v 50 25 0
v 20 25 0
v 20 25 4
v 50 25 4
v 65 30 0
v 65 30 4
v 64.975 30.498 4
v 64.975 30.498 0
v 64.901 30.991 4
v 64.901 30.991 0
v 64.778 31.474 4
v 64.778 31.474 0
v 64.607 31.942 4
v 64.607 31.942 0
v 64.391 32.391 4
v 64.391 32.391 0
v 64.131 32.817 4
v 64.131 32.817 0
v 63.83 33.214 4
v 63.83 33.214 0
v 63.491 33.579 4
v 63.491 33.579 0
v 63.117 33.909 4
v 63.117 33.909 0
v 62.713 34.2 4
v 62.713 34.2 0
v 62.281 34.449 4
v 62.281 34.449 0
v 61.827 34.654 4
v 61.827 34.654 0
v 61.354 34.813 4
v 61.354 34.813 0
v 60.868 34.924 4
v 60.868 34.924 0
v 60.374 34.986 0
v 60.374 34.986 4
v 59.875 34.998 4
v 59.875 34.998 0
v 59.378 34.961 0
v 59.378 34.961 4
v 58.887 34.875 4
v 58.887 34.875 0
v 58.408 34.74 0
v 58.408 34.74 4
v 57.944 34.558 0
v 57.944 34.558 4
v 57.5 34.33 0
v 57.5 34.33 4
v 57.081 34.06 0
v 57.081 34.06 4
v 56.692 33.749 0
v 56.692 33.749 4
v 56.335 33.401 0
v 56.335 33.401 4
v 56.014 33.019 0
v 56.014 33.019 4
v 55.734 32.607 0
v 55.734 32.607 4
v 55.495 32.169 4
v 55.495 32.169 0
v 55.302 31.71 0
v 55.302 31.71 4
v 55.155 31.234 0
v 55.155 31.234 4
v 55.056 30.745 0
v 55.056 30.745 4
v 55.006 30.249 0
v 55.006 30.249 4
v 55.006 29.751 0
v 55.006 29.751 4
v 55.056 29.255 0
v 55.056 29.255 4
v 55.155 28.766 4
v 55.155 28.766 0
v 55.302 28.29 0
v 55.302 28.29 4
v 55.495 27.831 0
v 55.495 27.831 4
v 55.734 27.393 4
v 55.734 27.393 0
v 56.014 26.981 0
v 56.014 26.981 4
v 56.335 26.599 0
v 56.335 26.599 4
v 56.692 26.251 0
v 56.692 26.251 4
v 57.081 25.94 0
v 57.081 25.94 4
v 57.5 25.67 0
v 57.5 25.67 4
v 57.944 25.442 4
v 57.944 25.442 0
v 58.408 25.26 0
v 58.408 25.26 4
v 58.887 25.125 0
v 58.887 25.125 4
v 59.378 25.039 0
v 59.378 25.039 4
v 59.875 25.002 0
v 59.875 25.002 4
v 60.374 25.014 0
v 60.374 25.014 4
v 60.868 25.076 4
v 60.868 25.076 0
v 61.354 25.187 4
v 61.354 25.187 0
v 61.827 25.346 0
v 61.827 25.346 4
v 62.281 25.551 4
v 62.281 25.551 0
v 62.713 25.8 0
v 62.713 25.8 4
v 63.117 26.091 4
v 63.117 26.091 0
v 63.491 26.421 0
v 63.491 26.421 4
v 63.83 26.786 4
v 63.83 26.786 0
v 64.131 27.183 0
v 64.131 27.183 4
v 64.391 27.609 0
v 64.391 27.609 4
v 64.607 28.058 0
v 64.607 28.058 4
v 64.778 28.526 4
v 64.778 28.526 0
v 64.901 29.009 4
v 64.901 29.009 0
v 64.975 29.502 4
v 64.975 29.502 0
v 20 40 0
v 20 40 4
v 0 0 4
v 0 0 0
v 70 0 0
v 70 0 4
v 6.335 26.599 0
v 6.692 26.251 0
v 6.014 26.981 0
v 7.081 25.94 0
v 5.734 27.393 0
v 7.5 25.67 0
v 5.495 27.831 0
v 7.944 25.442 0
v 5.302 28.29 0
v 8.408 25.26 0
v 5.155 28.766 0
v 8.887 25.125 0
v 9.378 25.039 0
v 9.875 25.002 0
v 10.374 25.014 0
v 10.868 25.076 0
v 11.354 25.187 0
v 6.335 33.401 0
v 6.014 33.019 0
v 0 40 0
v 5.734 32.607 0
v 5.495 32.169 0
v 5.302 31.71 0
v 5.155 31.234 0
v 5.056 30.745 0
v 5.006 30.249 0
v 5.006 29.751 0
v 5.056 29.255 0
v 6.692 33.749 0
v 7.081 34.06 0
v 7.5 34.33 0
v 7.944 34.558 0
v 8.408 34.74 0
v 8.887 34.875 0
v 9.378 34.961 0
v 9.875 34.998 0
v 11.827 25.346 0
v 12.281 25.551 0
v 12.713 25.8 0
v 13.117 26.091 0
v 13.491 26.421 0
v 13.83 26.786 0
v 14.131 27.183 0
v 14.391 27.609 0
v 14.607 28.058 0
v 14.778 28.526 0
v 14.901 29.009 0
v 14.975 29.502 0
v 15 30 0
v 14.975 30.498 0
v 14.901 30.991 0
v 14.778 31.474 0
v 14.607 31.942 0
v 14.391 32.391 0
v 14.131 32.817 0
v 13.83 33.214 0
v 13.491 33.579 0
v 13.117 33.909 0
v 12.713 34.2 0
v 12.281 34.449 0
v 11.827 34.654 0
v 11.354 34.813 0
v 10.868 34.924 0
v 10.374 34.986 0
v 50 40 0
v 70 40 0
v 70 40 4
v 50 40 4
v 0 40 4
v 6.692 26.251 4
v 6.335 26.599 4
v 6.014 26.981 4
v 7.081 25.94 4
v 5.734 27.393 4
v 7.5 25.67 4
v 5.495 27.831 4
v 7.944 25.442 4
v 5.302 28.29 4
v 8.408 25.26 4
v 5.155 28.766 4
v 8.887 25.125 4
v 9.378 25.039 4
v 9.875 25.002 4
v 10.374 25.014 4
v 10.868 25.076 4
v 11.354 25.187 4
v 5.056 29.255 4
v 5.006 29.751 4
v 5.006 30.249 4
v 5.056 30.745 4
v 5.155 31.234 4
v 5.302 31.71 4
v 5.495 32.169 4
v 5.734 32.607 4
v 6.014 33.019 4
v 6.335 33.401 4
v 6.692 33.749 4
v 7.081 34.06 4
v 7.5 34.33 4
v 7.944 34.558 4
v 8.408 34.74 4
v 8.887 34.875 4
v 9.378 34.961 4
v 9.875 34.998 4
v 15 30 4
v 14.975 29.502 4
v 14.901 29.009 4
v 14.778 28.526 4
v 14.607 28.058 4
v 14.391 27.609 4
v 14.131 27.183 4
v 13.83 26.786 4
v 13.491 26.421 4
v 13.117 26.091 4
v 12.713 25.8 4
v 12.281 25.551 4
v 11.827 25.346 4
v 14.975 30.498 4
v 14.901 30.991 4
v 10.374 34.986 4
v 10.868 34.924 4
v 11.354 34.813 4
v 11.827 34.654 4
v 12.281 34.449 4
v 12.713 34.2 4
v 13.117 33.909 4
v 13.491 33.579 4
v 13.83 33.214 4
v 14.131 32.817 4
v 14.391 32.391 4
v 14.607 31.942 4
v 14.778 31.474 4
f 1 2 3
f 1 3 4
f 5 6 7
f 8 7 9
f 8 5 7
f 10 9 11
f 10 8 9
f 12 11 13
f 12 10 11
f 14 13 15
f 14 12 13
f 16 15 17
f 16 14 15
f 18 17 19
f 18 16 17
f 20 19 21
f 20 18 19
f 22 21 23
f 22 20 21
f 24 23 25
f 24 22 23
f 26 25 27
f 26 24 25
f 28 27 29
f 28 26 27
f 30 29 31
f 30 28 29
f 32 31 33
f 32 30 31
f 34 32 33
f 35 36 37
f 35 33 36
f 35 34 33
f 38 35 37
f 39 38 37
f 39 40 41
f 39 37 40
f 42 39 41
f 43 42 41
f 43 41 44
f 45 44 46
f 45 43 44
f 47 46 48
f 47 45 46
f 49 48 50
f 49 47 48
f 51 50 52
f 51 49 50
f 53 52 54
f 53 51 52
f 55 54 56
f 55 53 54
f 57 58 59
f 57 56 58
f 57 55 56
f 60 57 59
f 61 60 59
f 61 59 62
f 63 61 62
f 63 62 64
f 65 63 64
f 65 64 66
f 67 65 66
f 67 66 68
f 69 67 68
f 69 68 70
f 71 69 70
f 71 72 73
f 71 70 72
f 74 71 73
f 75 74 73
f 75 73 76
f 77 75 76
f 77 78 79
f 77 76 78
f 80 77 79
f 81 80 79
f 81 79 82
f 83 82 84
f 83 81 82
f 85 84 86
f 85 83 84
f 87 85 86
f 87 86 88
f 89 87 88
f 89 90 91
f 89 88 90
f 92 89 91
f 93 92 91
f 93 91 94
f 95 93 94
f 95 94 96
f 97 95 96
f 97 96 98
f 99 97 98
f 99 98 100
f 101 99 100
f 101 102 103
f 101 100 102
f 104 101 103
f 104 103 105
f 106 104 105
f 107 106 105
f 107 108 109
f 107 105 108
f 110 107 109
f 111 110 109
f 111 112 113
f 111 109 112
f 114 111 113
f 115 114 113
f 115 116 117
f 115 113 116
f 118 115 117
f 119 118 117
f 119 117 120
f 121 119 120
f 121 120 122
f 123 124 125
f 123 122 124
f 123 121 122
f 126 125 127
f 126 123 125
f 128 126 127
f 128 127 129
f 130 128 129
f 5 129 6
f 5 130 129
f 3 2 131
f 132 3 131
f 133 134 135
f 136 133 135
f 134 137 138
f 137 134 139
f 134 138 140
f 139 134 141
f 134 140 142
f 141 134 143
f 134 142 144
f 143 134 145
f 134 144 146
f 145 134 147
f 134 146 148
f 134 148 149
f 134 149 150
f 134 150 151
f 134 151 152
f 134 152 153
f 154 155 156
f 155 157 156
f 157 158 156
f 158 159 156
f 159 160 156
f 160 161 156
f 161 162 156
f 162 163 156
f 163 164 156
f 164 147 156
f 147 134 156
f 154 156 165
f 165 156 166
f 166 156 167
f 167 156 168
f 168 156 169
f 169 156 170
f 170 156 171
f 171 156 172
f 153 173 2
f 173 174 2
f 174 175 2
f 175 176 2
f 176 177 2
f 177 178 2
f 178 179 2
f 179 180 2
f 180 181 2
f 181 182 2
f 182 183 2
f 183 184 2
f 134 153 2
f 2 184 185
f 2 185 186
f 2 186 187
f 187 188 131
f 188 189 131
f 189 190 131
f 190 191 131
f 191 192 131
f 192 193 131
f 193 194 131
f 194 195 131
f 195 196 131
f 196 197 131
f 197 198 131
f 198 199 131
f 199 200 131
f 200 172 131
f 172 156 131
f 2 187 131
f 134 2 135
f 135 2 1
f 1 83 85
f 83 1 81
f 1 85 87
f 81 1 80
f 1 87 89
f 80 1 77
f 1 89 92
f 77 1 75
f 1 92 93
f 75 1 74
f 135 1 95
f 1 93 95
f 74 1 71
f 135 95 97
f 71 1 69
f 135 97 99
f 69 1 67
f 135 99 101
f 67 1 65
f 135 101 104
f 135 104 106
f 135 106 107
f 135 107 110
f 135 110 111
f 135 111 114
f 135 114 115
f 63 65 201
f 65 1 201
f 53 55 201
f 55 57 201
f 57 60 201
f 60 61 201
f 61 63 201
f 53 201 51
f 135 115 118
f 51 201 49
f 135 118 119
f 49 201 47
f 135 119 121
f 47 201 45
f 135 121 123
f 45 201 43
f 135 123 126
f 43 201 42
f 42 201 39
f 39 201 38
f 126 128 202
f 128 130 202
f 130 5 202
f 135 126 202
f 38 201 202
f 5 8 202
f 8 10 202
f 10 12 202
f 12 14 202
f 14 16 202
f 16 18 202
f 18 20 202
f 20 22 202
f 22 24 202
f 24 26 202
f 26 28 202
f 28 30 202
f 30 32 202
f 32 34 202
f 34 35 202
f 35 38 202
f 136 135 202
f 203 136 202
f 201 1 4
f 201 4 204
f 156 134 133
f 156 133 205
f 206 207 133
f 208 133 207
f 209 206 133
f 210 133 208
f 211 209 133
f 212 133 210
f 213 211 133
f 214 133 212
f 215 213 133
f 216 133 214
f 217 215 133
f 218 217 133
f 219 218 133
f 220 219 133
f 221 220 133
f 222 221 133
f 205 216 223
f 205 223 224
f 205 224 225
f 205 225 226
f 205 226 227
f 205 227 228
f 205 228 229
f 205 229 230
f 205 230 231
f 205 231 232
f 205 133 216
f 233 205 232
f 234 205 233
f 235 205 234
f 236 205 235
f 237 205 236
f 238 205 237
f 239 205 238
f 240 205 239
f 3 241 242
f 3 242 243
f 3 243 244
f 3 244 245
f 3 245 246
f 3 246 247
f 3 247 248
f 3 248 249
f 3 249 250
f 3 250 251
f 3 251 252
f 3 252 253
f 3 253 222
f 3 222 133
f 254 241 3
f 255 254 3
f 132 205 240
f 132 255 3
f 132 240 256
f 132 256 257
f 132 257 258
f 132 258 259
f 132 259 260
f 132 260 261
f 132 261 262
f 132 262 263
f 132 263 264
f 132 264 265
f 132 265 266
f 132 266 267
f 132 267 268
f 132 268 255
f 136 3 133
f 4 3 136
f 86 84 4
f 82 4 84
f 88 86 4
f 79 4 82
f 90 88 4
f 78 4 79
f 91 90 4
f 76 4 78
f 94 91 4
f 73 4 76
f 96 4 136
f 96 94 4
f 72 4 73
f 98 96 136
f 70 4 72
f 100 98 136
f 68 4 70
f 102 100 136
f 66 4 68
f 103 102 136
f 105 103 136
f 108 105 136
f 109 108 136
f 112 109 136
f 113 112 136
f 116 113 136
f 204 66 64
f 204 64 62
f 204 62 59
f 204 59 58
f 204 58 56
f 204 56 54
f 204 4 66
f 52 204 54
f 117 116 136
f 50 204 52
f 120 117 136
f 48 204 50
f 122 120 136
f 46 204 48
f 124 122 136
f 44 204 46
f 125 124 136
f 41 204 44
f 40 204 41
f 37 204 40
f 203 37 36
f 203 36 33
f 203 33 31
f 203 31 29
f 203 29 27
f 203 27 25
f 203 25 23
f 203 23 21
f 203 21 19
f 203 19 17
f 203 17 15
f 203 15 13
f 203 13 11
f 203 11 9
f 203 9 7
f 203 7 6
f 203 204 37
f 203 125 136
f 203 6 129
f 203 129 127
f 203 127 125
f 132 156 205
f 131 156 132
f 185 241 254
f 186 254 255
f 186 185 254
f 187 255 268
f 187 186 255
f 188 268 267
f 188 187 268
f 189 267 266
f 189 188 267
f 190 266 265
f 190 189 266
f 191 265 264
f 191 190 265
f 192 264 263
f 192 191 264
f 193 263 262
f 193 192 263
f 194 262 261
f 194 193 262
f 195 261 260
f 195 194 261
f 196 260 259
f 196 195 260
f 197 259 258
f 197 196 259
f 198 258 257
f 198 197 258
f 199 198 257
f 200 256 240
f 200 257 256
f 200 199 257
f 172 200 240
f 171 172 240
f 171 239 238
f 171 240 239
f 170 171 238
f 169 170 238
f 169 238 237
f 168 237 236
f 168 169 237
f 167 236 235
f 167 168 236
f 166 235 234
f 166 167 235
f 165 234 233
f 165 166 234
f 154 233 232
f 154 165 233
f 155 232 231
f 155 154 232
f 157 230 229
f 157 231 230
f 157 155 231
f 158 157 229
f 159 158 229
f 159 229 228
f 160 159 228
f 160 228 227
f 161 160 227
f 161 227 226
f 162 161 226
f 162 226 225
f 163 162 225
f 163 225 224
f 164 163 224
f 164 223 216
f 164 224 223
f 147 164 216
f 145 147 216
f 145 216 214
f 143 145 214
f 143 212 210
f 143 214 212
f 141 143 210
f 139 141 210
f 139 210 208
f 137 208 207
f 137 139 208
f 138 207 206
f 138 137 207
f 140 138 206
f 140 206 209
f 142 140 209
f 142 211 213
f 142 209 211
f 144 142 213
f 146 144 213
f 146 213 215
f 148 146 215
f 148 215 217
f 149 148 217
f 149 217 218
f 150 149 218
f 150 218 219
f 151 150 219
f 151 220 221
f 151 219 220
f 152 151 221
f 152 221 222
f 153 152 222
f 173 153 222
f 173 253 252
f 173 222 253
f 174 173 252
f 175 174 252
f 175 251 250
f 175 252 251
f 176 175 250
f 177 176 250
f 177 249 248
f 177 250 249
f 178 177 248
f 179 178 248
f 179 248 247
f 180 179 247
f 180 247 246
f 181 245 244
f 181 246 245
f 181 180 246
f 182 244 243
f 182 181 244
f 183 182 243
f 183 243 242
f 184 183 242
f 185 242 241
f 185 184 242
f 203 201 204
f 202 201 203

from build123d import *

# Parameters (mm, degrees)
CYLINDER001_R     = 5
CYLINDER001_DEPTH = 10
CYLINDER_R        = 5
CYLINDER_DEPTH    = 10
BOX001_W          = 30
BOX001_H          = 15
BOX001_DEPTH      = 10
BOX_W             = 70
BOX_H             = 40
BOX_DEPTH         = 4


with BuildPart() as cylinder001:
    # Cylinder001 → Cylinder001 (new body)
    with BuildSketch(Plane(origin=(60, 30, 0), x_dir=(1, 0, 0), z_dir=(0, 0, 1))):
        Circle(CYLINDER001_R)
    extrude(amount=CYLINDER001_DEPTH)


with BuildPart() as cylinder:
    # Cylinder → Cylinder (new body)
    with BuildSketch(Plane(origin=(10, 30, 0), x_dir=(1, 0, 0), z_dir=(0, 0, 1))):
        Circle(CYLINDER_R)
    extrude(amount=CYLINDER_DEPTH)


with BuildPart() as cube001:
    # Box001 → Box001 (new body)
    with BuildSketch(Plane(origin=(20, 25, 0), x_dir=(1, 0, 0), z_dir=(0, 0, 1))):
        with Locations((15, 7.5)):
            Rectangle(BOX001_W, BOX001_H)
    extrude(amount=BOX001_DEPTH)


with BuildPart() as cut002:
    # Box → Box (new body)
    with BuildSketch(Plane.XY):
        with Locations((35, 20)):
            Rectangle(BOX_W, BOX_H)
    extrude(amount=BOX_DEPTH)

    # Cut: cut Cube001
    add(cube001.part, mode=Mode.SUBTRACT)

    # Cut001: cut Cylinder
    add(cylinder.part, mode=Mode.SUBTRACT)

    # Cut002: cut Cylinder001
    add(cylinder001.part, mode=Mode.SUBTRACT)


solid = cut002.part
